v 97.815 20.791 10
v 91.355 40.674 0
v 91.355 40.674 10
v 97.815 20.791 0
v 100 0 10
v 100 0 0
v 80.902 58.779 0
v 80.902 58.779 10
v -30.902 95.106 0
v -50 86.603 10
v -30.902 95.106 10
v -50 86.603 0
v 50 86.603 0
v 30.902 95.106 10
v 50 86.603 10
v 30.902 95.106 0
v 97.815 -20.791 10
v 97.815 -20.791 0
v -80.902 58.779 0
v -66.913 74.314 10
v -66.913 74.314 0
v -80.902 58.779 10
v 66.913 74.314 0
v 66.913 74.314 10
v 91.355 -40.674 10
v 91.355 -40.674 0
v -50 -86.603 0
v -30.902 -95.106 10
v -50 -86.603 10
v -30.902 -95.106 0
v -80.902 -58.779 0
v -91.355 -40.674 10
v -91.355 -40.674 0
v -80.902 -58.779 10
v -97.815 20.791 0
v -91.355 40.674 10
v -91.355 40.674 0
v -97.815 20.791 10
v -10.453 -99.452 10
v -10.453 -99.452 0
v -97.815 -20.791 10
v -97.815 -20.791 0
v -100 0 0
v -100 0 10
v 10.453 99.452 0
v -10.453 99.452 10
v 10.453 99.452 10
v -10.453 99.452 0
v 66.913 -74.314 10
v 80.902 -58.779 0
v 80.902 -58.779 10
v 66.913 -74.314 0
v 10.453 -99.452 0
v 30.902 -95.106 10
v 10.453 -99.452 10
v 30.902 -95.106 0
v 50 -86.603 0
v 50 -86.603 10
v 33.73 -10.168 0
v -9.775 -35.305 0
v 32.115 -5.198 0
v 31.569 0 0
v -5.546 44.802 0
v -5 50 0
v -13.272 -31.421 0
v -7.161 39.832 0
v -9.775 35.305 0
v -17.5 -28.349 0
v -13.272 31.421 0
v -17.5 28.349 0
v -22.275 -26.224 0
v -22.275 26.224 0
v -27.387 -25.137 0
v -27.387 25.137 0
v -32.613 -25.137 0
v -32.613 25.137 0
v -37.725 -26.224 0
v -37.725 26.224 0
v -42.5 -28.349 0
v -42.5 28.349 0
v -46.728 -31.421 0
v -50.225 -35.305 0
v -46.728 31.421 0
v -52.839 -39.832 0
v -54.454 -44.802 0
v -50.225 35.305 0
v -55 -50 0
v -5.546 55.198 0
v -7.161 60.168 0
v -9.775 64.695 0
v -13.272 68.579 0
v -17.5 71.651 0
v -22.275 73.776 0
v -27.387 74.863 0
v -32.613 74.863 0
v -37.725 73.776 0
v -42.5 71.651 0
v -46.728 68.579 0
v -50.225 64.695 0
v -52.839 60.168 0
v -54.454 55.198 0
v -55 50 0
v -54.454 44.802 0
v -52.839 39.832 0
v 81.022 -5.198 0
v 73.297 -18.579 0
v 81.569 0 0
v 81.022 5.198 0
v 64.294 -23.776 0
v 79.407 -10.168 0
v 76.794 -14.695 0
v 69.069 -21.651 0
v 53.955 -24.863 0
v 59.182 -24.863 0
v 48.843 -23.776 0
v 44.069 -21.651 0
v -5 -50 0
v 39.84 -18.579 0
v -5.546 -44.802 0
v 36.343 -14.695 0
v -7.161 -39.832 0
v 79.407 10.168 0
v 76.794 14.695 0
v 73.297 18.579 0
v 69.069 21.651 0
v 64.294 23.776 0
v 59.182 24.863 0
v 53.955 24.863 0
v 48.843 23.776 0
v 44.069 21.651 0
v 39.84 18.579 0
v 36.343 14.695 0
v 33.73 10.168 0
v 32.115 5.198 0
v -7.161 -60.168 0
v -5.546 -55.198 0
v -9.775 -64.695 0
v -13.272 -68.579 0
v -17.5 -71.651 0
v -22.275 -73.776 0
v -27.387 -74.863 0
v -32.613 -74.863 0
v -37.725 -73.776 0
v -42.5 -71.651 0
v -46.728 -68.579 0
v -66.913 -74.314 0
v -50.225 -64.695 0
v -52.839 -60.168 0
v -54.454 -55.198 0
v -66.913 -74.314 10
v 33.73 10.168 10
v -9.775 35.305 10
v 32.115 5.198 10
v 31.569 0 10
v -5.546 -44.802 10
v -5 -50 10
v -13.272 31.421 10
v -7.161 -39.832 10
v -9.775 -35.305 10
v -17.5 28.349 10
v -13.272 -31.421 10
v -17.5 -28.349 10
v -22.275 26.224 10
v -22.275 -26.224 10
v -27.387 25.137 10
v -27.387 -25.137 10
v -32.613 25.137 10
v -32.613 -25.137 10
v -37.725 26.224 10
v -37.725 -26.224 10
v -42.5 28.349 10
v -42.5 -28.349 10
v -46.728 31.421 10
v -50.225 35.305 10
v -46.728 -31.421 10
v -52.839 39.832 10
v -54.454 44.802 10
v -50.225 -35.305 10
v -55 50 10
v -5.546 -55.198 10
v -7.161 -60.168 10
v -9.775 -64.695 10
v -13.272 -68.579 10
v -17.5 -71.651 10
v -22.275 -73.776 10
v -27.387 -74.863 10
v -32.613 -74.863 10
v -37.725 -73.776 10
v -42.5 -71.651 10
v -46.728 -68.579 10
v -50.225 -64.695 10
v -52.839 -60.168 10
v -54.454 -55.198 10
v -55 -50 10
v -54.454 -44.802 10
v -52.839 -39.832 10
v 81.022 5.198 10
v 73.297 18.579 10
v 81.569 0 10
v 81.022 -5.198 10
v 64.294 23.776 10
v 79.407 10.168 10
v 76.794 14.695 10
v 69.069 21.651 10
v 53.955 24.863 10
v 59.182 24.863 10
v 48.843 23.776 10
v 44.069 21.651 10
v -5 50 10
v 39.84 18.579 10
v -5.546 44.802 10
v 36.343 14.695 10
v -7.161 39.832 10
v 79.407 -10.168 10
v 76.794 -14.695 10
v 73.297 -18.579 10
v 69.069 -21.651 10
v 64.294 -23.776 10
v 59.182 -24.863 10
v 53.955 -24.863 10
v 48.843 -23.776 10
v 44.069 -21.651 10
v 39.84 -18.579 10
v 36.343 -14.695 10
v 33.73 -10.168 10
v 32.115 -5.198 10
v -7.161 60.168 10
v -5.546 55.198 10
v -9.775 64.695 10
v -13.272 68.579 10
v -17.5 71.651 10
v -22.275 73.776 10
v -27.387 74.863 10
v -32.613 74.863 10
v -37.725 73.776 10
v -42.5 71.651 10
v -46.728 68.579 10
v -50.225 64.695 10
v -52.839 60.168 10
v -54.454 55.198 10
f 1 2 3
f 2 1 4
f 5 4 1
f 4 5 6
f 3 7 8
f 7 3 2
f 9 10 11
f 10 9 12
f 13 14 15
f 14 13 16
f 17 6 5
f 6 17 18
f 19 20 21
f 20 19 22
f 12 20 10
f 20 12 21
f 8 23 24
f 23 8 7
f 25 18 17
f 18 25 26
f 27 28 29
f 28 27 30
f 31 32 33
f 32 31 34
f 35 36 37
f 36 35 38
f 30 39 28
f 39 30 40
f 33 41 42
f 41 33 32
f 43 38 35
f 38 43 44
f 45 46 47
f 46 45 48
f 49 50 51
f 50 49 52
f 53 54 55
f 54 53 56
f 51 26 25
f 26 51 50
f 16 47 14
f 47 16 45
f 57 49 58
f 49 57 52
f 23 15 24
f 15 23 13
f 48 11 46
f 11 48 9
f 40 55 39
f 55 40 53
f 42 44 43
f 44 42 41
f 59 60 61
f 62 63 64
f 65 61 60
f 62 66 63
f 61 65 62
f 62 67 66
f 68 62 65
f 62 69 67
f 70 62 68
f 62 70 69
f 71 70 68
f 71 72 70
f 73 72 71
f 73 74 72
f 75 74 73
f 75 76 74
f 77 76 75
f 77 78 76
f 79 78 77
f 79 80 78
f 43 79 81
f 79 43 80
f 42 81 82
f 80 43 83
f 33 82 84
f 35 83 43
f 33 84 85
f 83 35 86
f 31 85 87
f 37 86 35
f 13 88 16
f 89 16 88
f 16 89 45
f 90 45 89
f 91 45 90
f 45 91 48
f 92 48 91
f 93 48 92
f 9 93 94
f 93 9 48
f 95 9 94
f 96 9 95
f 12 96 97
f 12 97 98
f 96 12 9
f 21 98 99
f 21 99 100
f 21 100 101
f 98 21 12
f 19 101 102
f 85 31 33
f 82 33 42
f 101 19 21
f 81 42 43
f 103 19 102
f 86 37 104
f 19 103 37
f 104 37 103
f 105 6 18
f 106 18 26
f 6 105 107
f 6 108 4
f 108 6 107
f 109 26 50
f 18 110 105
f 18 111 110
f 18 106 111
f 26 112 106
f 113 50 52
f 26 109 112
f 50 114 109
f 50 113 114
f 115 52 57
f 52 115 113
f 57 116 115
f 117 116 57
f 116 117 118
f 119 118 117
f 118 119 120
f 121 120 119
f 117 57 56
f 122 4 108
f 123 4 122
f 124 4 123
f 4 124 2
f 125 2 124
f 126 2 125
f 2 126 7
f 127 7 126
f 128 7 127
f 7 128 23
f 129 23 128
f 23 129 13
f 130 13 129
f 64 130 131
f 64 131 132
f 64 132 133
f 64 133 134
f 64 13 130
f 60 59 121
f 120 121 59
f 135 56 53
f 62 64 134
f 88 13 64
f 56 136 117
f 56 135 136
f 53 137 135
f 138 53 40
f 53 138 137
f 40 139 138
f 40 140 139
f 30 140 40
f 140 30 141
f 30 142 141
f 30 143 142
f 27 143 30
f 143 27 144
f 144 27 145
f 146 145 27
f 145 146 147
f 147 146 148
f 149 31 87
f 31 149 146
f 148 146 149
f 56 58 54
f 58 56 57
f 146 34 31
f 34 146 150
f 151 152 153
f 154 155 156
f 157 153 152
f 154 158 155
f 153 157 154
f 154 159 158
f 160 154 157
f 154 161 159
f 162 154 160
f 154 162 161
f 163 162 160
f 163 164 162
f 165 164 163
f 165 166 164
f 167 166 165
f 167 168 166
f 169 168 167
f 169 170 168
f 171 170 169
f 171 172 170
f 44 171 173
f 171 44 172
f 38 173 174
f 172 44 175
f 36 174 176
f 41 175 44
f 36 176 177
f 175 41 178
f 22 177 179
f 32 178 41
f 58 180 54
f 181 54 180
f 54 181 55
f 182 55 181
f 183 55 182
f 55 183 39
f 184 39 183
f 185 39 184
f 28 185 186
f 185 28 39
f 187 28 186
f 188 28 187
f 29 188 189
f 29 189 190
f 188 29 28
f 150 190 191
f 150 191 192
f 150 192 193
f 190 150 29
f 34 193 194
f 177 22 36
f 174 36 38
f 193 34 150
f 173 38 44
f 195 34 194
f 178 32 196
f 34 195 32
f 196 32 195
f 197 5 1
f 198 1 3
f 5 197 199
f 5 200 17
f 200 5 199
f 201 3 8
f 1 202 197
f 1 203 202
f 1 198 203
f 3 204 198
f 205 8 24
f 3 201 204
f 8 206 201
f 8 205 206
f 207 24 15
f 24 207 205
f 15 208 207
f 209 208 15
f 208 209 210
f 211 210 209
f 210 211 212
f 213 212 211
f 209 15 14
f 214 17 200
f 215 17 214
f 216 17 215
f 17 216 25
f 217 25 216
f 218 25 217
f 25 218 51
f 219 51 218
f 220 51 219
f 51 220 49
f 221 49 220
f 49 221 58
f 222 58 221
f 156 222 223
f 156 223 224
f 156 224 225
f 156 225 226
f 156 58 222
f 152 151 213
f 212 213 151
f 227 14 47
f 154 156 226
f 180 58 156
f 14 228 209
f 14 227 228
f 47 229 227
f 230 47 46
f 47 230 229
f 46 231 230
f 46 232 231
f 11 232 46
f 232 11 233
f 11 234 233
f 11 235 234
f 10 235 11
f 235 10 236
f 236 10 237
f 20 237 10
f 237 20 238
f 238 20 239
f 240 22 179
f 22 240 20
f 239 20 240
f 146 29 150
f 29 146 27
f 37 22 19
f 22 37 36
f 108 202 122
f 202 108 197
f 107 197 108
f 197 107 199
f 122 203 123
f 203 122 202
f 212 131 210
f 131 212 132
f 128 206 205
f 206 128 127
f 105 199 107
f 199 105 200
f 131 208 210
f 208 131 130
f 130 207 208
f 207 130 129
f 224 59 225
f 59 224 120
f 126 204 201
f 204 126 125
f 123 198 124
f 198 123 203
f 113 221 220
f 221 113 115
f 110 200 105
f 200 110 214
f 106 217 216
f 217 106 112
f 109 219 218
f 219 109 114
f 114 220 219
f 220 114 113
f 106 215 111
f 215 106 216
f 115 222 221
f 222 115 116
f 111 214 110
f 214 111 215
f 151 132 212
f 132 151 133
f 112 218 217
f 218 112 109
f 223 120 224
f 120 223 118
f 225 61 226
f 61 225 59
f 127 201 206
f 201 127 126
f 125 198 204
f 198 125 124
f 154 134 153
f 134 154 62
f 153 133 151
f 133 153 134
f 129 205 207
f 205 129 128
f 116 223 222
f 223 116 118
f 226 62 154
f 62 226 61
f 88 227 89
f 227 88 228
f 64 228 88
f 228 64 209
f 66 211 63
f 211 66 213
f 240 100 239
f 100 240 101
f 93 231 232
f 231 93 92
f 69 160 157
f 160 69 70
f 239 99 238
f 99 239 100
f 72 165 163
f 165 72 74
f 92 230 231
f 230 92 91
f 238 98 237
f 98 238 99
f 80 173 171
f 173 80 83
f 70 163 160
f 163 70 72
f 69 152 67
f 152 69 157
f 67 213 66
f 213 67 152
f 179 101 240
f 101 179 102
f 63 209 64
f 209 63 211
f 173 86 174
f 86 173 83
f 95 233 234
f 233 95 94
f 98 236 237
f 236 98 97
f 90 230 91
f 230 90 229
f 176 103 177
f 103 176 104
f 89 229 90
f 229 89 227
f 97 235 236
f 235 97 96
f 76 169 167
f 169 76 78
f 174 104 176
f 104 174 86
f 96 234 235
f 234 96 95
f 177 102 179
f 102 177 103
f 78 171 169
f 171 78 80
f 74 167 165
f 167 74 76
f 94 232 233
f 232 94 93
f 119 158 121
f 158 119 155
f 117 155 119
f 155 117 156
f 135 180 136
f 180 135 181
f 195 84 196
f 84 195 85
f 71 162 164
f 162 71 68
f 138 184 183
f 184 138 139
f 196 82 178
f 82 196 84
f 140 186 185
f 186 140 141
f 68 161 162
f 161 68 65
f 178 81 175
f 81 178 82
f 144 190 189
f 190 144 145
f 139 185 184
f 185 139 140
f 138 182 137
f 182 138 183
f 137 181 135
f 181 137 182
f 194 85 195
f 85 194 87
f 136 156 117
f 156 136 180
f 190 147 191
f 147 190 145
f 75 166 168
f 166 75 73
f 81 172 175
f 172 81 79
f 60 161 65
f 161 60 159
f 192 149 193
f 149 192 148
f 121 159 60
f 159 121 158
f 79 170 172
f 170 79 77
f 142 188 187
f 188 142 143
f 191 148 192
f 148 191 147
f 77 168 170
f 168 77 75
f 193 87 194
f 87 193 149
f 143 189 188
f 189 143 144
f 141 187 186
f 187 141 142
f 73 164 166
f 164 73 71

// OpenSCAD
dist = 40;
socket = 50;
h = 10;

difference(){
    cylinder(h, d=200);
    translate([sqrt(2)*dist,0,0])
    cylinder(h*2, d=socket);
    translate([-(dist-10),dist+10,0])
    cylinder(h*2, d=socket);
    translate([-(dist-10),-(dist+10),0])
    cylinder(h* 2, d=socket);

}
